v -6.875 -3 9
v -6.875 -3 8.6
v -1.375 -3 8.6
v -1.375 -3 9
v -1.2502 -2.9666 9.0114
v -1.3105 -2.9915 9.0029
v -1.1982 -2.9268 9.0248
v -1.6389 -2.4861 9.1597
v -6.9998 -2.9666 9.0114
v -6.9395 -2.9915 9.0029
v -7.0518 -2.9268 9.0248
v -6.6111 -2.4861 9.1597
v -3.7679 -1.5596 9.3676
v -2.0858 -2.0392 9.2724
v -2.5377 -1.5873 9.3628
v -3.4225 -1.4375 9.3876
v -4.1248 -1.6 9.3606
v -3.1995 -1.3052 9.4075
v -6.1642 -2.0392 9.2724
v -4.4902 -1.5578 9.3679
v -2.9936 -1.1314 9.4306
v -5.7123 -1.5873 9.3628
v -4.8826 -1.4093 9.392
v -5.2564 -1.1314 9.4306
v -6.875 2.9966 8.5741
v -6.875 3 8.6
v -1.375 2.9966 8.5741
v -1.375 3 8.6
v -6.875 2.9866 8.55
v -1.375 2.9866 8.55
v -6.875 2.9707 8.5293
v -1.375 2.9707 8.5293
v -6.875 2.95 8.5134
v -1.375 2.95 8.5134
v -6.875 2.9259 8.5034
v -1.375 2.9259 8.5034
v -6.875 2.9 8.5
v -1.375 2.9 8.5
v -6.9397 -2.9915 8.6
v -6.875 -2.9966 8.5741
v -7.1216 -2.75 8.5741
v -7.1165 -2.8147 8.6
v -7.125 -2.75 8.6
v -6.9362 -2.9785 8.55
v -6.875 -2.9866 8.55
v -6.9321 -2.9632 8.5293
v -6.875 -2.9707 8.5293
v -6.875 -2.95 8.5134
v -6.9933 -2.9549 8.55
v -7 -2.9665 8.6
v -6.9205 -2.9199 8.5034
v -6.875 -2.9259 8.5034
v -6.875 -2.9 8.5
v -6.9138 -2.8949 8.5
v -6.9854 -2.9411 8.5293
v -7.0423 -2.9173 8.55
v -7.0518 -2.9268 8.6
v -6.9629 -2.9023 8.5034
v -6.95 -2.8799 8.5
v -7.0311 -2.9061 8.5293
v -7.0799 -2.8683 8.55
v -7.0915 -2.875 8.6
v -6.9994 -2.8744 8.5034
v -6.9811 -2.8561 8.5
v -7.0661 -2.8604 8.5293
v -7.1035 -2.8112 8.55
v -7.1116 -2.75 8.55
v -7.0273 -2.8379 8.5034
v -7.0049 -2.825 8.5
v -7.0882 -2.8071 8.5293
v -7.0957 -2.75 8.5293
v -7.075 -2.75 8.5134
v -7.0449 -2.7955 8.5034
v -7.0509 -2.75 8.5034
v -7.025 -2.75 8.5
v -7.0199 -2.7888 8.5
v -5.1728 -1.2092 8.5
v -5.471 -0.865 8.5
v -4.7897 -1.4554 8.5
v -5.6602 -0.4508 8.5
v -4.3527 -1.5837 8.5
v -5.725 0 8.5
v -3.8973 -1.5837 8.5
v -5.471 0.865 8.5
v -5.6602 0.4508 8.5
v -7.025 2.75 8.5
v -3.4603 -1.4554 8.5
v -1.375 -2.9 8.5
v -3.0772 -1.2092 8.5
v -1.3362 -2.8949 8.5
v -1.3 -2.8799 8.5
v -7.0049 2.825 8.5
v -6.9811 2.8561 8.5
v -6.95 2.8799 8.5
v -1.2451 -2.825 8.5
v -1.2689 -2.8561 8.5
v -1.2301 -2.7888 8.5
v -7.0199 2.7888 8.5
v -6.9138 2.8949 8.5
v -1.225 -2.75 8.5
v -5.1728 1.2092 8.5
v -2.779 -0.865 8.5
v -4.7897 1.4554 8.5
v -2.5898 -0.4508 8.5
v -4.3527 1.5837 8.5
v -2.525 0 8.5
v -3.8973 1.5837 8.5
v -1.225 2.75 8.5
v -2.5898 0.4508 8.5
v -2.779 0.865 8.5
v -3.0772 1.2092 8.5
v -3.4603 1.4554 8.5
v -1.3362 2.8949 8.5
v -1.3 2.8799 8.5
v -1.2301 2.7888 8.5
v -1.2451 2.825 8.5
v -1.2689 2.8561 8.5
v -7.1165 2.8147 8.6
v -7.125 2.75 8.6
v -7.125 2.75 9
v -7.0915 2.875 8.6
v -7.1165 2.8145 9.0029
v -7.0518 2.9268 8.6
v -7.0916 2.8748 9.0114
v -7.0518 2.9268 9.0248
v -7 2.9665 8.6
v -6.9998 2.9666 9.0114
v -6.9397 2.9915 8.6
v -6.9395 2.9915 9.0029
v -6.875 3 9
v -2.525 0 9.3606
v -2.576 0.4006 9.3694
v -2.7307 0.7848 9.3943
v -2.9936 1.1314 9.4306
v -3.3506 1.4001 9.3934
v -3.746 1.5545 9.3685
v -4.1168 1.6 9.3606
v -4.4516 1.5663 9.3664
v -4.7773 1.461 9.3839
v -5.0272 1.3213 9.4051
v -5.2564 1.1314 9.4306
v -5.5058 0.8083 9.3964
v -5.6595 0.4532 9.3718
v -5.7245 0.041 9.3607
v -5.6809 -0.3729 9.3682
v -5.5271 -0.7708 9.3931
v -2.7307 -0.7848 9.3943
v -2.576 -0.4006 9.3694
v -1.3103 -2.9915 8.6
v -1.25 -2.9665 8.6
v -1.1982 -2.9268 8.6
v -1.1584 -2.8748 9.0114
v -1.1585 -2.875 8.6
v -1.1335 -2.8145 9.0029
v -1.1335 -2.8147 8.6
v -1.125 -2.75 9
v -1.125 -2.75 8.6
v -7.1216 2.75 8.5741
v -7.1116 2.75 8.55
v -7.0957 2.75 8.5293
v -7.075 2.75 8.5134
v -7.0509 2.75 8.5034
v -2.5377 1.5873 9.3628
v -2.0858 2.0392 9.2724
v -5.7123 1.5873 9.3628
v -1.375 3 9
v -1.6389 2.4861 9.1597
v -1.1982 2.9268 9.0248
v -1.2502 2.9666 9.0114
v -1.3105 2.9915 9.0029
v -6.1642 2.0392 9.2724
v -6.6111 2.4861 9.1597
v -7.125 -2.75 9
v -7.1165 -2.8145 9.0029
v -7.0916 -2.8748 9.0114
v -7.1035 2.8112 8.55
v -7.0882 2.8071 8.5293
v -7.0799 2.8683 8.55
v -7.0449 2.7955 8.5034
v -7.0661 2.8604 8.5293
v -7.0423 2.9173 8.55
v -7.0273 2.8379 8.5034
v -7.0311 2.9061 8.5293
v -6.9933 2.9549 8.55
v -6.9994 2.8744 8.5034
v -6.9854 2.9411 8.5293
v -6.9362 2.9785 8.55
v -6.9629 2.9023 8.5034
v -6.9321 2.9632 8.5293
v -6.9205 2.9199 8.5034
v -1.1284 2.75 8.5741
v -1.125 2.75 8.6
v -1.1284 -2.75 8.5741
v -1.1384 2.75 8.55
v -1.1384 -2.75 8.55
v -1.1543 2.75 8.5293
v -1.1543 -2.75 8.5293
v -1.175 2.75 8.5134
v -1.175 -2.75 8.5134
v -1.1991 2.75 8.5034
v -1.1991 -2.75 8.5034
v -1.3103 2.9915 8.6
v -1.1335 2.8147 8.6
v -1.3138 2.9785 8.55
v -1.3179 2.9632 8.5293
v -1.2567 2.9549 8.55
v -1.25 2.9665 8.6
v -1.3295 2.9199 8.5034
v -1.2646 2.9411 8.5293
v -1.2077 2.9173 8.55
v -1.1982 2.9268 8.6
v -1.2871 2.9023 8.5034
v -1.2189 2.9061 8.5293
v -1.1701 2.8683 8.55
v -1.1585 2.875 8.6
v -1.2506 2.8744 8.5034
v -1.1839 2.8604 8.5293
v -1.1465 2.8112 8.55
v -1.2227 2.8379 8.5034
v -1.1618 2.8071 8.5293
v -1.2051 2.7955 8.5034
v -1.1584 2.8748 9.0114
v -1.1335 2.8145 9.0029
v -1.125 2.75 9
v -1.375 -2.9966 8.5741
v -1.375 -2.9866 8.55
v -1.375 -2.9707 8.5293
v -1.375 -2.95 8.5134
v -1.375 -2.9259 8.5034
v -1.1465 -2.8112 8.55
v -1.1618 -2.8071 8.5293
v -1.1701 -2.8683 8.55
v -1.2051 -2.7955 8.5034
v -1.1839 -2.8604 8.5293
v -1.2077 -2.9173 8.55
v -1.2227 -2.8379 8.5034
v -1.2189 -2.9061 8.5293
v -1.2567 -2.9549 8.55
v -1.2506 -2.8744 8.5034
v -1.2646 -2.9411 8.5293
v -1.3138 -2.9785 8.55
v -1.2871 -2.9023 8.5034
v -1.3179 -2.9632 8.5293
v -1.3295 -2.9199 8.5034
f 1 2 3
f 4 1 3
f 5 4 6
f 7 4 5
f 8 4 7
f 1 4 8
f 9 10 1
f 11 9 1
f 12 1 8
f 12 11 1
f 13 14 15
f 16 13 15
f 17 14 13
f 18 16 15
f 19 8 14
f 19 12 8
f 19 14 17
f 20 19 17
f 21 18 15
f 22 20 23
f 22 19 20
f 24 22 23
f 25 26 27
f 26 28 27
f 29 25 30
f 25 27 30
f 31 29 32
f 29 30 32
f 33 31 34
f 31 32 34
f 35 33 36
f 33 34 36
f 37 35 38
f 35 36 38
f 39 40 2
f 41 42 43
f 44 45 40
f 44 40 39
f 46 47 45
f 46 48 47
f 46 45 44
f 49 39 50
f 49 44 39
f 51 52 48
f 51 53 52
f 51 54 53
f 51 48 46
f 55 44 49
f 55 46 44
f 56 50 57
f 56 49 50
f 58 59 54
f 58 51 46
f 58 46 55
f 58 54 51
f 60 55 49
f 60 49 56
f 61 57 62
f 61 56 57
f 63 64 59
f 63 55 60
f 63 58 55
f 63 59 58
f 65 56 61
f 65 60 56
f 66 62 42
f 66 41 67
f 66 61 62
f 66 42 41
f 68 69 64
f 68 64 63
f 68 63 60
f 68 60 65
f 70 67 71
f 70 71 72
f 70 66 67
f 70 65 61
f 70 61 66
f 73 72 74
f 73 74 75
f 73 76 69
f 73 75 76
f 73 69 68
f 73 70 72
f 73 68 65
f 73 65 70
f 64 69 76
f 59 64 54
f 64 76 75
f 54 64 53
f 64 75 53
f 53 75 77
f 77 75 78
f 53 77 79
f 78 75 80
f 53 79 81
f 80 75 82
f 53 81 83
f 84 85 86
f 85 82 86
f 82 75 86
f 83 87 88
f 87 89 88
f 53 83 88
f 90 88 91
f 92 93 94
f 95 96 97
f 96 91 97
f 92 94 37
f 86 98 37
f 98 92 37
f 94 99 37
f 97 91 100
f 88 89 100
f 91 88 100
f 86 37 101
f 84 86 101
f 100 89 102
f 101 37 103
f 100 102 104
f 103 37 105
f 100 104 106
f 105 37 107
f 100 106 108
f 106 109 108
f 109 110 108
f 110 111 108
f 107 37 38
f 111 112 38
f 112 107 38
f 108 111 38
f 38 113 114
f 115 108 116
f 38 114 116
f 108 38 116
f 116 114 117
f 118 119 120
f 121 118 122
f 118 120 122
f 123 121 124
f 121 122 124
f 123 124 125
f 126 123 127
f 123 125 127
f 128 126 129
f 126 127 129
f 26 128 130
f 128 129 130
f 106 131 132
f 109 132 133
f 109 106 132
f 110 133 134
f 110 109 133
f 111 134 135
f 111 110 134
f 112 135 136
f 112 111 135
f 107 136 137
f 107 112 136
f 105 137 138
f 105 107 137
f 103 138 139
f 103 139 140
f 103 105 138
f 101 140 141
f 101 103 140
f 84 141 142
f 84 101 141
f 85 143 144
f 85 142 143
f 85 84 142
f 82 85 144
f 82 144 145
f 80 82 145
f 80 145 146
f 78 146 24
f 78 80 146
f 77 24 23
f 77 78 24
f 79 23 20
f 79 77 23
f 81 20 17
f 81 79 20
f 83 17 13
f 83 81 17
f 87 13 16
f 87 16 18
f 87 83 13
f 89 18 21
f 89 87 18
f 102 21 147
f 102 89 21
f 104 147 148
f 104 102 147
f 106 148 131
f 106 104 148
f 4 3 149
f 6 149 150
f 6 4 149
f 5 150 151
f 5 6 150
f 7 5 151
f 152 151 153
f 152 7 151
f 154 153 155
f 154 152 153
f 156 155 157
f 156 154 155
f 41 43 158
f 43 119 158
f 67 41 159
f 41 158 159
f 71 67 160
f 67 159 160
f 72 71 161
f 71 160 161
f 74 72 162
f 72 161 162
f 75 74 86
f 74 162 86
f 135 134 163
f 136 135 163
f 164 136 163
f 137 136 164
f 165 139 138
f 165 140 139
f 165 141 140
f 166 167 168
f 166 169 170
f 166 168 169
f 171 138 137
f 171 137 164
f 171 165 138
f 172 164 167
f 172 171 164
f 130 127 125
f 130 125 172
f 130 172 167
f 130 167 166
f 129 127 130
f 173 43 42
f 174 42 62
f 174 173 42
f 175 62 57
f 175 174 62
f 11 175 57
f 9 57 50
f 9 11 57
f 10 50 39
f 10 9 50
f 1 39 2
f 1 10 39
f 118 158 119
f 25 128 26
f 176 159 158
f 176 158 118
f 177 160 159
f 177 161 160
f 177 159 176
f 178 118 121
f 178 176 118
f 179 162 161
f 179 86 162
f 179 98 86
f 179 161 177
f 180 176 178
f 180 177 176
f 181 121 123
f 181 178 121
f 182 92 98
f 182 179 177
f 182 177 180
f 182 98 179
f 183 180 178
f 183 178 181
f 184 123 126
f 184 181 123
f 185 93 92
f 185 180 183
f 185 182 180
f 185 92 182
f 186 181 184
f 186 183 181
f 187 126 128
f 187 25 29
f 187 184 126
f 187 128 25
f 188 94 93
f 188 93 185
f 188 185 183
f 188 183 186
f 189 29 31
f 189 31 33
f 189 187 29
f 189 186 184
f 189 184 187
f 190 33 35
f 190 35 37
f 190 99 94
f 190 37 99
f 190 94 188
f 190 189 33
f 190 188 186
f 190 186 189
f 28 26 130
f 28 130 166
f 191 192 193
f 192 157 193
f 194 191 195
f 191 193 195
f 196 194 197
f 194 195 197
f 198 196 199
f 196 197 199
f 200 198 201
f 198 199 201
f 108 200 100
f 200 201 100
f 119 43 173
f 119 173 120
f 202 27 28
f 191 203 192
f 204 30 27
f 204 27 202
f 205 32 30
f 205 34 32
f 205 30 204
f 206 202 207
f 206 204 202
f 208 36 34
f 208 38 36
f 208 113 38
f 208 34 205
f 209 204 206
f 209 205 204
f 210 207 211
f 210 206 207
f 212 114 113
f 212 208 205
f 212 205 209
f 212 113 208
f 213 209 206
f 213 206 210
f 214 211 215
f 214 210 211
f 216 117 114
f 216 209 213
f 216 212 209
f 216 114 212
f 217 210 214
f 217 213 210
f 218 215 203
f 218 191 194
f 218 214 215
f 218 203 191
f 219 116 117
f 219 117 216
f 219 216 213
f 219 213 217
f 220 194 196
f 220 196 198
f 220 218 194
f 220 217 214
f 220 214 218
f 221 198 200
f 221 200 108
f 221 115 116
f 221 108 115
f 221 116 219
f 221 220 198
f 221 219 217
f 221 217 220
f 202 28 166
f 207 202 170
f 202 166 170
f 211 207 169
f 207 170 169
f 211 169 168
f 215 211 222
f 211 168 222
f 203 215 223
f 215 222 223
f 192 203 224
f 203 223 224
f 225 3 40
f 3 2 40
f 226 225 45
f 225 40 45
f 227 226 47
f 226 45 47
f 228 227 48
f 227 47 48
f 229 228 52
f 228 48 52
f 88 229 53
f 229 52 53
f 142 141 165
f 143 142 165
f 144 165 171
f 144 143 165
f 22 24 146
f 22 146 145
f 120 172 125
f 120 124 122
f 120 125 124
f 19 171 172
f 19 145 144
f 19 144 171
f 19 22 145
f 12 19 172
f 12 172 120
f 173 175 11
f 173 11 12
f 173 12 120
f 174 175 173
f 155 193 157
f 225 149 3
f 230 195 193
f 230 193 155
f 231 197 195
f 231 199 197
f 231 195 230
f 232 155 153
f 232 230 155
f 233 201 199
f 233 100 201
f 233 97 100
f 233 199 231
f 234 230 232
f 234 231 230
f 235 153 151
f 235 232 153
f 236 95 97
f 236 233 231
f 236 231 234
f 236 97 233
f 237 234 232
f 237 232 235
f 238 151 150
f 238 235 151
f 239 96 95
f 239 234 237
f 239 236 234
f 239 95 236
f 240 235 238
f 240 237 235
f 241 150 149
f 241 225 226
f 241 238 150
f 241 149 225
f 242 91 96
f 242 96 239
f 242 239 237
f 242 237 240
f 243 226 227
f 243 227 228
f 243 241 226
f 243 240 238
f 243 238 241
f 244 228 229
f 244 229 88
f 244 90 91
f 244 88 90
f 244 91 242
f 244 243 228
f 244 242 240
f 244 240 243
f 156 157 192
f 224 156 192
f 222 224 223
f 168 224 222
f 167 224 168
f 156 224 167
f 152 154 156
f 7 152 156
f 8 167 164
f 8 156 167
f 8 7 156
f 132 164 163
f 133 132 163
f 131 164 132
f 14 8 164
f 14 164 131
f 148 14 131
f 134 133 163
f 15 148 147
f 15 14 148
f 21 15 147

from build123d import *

# Parameters (mm, degrees)
SKETCH011_W     = 6
SKETCH011_H     = 6
SKETCH011_R     = 1.6
PAD003_DEPTH    = 1
POCKET007_DEPTH = 6.001
POCKET008_DEPTH = 6
FILLET002_R     = 0.25
FILLET003_R     = 0.1


with BuildPart() as part:
    # Sketch011 → Pad003 (new body)
    with BuildSketch(Plane.XY.offset(8.5)):
        with Locations((-4.125, 0)):
            Rectangle(SKETCH011_W, SKETCH011_H)
        with Locations((-4.125, 0)):
            Circle(SKETCH011_R, mode=Mode.SUBTRACT)
    extrude(amount=PAD003_DEPTH)

    # Sketch012 → Pocket007 (cut, through all)
    with BuildSketch(Plane(origin=(0, -3, 8.5), x_dir=(1, 0, 0), z_dir=(0, -1, 0))):
        with BuildLine():
            ThreePointArc((-1.125, 0.5), (-4.125, 1), (-7.125, 0.5))
            Line((-7.740595, 0.5), (-7.125, 0.5))
            Line((-7.740595, 1.84364), (-7.740595, 0.5))
            Line((-7.740595, 1.84364), (-0.509405, 1.84364))
            Line((-0.509405, 1.84364), (-0.509405, 0.5))
            Line((-0.509405, 0.5), (-1.125, 0.5))
        make_face()
    extrude(amount=-POCKET007_DEPTH, mode=Mode.SUBTRACT)

    # Sketch013 → Pocket008 (cut)
    with BuildSketch(Plane(origin=(-7.125, 0, 8.5), x_dir=(0, -1, 0), z_dir=(-1, 0, 0))):
        with BuildLine():
            ThreePointArc((3, 0.5), (0, 1), (-3, 0.5))
            Line((-3.32758, 0.5), (-3, 0.5))
            Line((-3.32758, 1.60662), (-3.32758, 0.5))
            Line((-3.32758, 1.60662), (3.32758, 1.60662))
            Line((3.32758, 1.60662), (3.32758, 0.5))
            Line((3.32758, 0.5), (3, 0.5))
        make_face()
    extrude(amount=-POCKET008_DEPTH, mode=Mode.SUBTRACT)

    # Fillet002
    fillet002_edges = [part.edges().sort_by_distance(p)[0] for p in [
        (-7.125, -3, 8.75),
        (-7.125, 3, 8.75),
        (-1.125, -3, 8.75),
        (-1.125, 3, 8.75),
    ]]
    fillet(fillet002_edges, radius=FILLET002_R)

    # Fillet003
    fillet003_edges = [part.edges().sort_by_distance(p)[0] for p in [
        (-7.125, 0, 8.5),
    ]]
    fillet(fillet003_edges, radius=FILLET003_R)


solid = part.part
